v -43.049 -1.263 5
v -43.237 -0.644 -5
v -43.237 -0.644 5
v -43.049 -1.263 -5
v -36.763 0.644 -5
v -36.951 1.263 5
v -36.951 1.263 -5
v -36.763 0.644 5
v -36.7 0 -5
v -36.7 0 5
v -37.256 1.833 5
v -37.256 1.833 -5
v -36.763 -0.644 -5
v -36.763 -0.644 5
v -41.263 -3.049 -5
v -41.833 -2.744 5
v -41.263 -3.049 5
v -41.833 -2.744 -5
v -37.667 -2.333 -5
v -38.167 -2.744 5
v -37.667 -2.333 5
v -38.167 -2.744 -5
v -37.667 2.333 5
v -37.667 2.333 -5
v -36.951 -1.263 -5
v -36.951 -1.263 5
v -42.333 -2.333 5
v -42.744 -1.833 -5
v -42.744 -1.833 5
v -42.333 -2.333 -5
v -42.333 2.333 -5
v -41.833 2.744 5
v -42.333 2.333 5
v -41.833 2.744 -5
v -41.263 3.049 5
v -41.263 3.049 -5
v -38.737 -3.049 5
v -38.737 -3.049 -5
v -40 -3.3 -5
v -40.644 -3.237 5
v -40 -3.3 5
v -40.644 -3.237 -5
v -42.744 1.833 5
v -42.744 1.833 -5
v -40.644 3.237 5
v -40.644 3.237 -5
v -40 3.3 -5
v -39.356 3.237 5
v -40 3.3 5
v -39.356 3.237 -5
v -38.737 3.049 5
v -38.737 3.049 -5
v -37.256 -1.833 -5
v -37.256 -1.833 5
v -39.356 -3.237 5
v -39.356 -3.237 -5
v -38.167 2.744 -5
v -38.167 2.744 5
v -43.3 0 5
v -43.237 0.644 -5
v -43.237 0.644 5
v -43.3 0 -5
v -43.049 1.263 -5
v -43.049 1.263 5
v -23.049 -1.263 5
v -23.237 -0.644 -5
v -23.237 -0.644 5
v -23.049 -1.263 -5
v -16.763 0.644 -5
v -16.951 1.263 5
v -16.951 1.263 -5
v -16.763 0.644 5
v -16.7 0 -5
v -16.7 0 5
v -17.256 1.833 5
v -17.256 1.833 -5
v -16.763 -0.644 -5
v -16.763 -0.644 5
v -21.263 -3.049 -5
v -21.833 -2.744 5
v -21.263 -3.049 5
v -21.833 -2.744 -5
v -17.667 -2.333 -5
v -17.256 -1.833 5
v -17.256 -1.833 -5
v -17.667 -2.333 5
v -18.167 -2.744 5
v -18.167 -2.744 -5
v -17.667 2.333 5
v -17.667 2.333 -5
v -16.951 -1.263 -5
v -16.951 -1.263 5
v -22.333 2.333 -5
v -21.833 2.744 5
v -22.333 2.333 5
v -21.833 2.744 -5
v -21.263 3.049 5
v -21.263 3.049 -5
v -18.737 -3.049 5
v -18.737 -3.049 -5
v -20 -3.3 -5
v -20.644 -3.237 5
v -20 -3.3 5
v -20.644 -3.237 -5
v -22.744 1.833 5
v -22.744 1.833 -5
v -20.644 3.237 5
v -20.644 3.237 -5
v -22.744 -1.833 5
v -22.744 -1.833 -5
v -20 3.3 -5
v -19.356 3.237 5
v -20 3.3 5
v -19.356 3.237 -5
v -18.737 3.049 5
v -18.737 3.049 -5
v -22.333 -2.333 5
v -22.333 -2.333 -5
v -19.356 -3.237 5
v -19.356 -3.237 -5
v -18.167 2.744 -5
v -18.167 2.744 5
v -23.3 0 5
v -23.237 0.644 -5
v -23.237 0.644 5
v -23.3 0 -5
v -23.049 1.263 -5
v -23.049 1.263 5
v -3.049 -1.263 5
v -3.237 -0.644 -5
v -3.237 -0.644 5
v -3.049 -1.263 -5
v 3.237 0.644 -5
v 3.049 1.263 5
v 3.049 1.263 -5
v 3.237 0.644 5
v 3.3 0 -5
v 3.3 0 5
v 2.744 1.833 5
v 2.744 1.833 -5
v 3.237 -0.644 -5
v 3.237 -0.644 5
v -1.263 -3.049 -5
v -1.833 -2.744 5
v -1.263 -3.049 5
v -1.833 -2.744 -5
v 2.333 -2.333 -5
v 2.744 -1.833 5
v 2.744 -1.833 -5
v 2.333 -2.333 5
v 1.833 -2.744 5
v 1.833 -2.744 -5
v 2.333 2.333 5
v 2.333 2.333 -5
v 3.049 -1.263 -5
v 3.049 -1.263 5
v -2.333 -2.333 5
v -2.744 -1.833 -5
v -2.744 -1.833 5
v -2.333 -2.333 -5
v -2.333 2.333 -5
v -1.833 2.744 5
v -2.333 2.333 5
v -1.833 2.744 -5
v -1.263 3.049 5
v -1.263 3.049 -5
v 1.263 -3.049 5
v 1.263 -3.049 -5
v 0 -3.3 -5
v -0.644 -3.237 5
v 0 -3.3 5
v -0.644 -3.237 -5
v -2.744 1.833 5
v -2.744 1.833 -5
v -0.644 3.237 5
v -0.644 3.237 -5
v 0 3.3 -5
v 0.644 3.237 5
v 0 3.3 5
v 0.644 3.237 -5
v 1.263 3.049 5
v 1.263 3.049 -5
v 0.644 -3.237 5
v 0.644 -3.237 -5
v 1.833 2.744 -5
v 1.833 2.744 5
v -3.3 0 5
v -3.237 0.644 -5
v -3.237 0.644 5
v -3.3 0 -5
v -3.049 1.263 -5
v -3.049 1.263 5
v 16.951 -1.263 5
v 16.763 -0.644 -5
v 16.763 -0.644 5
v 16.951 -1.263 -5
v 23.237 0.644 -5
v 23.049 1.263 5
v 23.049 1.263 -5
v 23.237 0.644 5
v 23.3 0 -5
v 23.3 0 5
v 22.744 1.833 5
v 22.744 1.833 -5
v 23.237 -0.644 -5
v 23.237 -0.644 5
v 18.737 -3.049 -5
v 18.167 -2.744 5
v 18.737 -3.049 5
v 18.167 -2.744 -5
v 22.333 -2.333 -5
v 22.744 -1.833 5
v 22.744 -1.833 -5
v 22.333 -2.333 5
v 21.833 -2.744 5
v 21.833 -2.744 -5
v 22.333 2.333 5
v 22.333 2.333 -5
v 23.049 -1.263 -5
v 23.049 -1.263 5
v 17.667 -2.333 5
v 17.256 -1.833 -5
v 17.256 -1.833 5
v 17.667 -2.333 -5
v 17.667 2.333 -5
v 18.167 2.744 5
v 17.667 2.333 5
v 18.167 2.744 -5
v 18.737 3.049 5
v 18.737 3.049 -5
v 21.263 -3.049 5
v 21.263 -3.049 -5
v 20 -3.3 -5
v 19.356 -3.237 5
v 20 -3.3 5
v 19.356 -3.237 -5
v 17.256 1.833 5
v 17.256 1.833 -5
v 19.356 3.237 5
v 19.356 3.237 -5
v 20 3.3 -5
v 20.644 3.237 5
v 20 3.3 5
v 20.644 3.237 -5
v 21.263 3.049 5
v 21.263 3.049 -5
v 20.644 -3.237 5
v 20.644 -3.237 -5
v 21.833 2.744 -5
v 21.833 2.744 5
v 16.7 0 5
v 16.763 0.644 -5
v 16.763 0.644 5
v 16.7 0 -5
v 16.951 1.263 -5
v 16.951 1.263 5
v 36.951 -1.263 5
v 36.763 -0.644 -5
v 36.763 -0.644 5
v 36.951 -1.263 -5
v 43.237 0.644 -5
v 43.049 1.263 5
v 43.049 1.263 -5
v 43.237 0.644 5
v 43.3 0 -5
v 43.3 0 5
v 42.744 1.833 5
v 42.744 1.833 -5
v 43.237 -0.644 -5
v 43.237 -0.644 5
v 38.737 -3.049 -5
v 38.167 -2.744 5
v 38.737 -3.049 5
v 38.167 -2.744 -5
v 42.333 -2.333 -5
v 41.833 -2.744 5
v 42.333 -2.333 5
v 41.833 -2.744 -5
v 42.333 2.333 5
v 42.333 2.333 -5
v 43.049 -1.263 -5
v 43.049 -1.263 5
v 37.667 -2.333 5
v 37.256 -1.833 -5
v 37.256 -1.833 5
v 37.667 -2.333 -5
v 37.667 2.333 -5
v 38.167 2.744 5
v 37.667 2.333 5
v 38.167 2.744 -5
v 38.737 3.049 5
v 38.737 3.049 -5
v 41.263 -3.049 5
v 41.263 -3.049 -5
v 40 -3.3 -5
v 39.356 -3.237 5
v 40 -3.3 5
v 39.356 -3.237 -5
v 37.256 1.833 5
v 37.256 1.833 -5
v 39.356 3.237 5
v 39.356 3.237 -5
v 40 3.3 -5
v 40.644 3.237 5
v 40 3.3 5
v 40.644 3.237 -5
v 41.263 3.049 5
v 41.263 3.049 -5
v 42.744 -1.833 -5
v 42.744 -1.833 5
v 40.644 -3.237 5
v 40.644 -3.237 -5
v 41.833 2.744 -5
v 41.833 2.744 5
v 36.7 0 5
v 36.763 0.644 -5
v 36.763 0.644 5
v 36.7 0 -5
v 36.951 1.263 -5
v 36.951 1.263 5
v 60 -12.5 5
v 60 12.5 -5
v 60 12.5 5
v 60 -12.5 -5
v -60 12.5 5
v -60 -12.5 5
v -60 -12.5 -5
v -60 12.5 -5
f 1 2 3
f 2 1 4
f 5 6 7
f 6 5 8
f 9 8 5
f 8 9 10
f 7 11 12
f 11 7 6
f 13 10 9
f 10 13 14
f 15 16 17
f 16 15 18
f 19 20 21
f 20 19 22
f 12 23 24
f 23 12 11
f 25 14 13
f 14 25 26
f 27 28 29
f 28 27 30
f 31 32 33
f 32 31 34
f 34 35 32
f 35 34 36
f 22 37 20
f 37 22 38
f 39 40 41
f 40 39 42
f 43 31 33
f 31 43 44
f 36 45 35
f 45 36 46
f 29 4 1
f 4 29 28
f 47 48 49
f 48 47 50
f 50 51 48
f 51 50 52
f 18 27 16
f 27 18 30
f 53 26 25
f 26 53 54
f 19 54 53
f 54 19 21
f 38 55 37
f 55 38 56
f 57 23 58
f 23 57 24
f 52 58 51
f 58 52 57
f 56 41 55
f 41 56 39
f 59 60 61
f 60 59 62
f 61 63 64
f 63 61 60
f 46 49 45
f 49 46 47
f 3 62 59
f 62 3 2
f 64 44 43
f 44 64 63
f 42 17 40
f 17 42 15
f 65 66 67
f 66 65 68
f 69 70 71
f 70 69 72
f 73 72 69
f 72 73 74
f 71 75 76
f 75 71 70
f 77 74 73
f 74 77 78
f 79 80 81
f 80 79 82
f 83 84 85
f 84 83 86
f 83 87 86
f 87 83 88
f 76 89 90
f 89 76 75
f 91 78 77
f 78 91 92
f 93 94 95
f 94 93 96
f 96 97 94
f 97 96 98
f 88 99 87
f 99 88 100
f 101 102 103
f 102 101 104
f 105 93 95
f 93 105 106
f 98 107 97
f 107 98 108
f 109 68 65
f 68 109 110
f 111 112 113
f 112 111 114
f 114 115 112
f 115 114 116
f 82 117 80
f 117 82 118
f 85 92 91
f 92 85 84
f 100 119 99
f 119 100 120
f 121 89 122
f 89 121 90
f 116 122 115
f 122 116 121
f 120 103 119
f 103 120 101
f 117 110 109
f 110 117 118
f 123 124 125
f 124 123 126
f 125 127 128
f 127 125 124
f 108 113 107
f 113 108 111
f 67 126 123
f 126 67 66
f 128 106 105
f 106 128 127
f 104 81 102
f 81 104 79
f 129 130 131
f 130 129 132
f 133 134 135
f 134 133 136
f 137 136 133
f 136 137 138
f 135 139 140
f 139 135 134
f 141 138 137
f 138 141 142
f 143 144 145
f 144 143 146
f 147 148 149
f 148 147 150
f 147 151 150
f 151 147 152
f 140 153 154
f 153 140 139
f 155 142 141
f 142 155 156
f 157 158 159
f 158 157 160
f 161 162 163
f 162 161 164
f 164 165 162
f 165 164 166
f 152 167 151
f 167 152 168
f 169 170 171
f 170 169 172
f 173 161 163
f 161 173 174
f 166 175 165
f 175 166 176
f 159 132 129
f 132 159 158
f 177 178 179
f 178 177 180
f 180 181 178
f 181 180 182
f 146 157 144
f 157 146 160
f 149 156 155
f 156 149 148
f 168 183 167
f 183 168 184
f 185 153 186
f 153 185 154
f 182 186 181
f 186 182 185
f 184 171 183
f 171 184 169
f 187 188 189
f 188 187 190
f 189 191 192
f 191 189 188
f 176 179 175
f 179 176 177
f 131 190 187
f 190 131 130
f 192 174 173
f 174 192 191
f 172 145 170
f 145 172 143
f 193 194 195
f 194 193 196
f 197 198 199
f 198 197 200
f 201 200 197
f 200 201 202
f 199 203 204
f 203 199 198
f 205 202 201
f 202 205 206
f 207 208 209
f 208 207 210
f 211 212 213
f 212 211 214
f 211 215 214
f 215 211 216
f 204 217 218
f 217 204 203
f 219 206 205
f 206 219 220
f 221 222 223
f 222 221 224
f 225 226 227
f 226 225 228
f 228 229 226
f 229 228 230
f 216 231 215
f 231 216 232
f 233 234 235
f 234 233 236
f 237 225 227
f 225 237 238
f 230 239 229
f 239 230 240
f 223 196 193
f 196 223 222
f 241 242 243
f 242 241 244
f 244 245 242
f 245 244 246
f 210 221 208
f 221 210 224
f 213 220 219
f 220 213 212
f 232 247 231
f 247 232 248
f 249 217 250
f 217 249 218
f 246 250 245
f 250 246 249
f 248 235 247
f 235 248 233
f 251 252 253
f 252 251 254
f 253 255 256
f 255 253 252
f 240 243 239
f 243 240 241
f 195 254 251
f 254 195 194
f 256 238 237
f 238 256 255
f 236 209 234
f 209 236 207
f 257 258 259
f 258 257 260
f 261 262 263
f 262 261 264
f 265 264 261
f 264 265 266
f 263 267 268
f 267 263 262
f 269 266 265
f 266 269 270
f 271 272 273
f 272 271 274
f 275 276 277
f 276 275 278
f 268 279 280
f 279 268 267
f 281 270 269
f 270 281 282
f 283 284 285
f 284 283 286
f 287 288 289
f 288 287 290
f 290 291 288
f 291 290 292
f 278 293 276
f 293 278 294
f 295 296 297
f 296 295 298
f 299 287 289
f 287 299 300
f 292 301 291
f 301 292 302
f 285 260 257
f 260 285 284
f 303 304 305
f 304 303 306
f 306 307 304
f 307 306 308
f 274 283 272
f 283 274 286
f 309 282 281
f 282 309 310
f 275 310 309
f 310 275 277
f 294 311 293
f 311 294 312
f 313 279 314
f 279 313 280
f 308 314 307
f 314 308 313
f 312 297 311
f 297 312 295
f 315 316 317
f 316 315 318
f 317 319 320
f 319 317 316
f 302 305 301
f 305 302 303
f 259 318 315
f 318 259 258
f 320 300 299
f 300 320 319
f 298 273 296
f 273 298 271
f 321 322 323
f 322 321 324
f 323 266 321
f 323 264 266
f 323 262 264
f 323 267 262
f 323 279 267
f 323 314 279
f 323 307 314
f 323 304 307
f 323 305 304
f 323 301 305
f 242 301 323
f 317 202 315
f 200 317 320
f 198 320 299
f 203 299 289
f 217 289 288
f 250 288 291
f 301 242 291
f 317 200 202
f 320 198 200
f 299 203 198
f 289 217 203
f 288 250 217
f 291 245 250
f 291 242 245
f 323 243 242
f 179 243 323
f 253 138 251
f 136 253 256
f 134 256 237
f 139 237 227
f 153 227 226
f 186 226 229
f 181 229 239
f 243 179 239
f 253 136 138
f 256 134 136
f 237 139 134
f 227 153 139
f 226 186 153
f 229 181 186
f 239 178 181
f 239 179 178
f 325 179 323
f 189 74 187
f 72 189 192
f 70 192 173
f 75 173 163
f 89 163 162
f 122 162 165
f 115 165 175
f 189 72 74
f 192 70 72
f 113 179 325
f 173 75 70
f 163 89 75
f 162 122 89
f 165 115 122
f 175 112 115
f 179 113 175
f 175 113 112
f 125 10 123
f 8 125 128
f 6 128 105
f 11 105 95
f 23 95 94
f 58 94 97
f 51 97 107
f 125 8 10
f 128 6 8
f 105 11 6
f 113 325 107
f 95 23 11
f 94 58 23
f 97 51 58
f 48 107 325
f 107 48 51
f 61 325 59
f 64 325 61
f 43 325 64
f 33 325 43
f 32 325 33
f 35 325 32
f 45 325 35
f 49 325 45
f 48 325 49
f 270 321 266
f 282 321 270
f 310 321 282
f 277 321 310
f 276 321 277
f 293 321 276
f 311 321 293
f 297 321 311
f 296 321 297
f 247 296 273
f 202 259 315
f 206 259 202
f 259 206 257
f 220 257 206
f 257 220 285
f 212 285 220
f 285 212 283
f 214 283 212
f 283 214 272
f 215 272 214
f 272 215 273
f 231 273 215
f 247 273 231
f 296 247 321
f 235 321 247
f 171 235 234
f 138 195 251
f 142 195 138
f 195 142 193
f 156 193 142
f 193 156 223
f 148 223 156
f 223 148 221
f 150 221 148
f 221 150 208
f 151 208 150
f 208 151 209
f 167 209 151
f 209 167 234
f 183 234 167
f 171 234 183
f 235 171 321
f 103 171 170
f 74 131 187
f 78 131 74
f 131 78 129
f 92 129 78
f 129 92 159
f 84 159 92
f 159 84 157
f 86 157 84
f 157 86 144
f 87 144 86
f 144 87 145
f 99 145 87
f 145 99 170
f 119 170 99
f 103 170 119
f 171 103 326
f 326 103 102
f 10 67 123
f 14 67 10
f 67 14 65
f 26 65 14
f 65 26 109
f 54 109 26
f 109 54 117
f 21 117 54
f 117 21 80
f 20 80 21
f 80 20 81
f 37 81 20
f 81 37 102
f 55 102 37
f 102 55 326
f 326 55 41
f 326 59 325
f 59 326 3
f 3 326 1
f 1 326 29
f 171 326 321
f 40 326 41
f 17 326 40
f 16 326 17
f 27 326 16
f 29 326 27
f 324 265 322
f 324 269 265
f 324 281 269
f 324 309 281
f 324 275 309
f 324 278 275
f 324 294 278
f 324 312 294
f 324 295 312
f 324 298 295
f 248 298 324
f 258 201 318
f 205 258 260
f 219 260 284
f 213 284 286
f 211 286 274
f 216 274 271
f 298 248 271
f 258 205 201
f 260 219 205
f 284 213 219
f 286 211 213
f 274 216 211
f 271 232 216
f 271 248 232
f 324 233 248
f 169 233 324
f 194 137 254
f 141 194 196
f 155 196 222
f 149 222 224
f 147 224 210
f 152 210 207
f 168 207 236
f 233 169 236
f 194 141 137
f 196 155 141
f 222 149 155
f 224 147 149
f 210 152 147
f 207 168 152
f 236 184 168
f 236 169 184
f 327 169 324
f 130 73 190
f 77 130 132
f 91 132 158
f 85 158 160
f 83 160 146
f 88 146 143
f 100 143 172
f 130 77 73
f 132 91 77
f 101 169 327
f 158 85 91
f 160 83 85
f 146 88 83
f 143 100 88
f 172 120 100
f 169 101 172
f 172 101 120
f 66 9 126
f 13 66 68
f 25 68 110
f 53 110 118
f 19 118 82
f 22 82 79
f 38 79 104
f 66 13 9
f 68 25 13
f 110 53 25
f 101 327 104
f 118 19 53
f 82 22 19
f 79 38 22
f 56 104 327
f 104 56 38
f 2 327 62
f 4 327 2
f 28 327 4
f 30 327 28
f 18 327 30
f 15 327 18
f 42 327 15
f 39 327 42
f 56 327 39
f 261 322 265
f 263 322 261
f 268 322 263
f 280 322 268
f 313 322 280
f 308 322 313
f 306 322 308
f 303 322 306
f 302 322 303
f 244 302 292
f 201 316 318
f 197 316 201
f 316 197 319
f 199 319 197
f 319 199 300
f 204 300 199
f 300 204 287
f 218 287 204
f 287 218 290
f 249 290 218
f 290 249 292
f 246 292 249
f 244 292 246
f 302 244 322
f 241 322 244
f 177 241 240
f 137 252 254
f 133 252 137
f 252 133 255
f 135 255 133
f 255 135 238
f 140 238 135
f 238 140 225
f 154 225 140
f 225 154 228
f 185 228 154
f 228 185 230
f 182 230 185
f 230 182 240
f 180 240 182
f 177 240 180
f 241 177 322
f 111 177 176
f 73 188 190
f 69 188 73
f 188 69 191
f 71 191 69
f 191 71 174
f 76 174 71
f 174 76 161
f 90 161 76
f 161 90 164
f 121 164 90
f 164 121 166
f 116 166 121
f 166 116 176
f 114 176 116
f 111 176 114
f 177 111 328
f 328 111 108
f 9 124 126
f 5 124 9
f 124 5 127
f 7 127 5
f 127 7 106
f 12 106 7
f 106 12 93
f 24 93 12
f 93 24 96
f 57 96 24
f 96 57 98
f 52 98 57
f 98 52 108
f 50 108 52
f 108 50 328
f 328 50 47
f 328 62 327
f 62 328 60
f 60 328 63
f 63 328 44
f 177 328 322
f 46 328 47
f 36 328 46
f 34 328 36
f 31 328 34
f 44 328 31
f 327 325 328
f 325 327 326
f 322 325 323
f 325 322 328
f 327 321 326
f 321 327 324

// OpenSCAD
$fn = 32;

// ----------------------------------------------------------------------
// Hole bar, 5 x Ø6.6
// row layout, 20 mm edge offset
// ----------------------------------------------------------------------

// --- parameters (mm) ---
bar_w = 25;    // bar width (Y)
bar_t = 10;    // bar thickness (Z)
holes = 5;     // holes per row
hole_d = 6.6;  // hole diameter
edge = 20;     // offset from the bar end to the first hole
pitch = 20;    // pitch between neighbouring holes

// --- derived feature positions (mm) ---
span = (holes - 1) * pitch;   // = 80   distance between the end holes
bar_l = span + 2 * edge;      // = 120   overall bar length
start_x = -bar_l / 2 + edge;  // = -40   X of the first hole
feature_centers = [
  [start_x + 0 * pitch, 0],
  [start_x + 1 * pitch, 0],
  [start_x + 2 * pitch, 0],
  [start_x + 3 * pitch, 0],
  [start_x + 4 * pitch, 0]
];   // hole centres of the first row

// bar with one row of holes, drilled from feature_centers
difference() {
  translate([-bar_l / 2, -bar_w / 2, -bar_t / 2]) cube([bar_l, bar_w, bar_t]);
  for (centre = feature_centers)
    translate([centre[0], centre[1], 0])
      cylinder(d = hole_d, h = bar_t + 2, center = true);
}
